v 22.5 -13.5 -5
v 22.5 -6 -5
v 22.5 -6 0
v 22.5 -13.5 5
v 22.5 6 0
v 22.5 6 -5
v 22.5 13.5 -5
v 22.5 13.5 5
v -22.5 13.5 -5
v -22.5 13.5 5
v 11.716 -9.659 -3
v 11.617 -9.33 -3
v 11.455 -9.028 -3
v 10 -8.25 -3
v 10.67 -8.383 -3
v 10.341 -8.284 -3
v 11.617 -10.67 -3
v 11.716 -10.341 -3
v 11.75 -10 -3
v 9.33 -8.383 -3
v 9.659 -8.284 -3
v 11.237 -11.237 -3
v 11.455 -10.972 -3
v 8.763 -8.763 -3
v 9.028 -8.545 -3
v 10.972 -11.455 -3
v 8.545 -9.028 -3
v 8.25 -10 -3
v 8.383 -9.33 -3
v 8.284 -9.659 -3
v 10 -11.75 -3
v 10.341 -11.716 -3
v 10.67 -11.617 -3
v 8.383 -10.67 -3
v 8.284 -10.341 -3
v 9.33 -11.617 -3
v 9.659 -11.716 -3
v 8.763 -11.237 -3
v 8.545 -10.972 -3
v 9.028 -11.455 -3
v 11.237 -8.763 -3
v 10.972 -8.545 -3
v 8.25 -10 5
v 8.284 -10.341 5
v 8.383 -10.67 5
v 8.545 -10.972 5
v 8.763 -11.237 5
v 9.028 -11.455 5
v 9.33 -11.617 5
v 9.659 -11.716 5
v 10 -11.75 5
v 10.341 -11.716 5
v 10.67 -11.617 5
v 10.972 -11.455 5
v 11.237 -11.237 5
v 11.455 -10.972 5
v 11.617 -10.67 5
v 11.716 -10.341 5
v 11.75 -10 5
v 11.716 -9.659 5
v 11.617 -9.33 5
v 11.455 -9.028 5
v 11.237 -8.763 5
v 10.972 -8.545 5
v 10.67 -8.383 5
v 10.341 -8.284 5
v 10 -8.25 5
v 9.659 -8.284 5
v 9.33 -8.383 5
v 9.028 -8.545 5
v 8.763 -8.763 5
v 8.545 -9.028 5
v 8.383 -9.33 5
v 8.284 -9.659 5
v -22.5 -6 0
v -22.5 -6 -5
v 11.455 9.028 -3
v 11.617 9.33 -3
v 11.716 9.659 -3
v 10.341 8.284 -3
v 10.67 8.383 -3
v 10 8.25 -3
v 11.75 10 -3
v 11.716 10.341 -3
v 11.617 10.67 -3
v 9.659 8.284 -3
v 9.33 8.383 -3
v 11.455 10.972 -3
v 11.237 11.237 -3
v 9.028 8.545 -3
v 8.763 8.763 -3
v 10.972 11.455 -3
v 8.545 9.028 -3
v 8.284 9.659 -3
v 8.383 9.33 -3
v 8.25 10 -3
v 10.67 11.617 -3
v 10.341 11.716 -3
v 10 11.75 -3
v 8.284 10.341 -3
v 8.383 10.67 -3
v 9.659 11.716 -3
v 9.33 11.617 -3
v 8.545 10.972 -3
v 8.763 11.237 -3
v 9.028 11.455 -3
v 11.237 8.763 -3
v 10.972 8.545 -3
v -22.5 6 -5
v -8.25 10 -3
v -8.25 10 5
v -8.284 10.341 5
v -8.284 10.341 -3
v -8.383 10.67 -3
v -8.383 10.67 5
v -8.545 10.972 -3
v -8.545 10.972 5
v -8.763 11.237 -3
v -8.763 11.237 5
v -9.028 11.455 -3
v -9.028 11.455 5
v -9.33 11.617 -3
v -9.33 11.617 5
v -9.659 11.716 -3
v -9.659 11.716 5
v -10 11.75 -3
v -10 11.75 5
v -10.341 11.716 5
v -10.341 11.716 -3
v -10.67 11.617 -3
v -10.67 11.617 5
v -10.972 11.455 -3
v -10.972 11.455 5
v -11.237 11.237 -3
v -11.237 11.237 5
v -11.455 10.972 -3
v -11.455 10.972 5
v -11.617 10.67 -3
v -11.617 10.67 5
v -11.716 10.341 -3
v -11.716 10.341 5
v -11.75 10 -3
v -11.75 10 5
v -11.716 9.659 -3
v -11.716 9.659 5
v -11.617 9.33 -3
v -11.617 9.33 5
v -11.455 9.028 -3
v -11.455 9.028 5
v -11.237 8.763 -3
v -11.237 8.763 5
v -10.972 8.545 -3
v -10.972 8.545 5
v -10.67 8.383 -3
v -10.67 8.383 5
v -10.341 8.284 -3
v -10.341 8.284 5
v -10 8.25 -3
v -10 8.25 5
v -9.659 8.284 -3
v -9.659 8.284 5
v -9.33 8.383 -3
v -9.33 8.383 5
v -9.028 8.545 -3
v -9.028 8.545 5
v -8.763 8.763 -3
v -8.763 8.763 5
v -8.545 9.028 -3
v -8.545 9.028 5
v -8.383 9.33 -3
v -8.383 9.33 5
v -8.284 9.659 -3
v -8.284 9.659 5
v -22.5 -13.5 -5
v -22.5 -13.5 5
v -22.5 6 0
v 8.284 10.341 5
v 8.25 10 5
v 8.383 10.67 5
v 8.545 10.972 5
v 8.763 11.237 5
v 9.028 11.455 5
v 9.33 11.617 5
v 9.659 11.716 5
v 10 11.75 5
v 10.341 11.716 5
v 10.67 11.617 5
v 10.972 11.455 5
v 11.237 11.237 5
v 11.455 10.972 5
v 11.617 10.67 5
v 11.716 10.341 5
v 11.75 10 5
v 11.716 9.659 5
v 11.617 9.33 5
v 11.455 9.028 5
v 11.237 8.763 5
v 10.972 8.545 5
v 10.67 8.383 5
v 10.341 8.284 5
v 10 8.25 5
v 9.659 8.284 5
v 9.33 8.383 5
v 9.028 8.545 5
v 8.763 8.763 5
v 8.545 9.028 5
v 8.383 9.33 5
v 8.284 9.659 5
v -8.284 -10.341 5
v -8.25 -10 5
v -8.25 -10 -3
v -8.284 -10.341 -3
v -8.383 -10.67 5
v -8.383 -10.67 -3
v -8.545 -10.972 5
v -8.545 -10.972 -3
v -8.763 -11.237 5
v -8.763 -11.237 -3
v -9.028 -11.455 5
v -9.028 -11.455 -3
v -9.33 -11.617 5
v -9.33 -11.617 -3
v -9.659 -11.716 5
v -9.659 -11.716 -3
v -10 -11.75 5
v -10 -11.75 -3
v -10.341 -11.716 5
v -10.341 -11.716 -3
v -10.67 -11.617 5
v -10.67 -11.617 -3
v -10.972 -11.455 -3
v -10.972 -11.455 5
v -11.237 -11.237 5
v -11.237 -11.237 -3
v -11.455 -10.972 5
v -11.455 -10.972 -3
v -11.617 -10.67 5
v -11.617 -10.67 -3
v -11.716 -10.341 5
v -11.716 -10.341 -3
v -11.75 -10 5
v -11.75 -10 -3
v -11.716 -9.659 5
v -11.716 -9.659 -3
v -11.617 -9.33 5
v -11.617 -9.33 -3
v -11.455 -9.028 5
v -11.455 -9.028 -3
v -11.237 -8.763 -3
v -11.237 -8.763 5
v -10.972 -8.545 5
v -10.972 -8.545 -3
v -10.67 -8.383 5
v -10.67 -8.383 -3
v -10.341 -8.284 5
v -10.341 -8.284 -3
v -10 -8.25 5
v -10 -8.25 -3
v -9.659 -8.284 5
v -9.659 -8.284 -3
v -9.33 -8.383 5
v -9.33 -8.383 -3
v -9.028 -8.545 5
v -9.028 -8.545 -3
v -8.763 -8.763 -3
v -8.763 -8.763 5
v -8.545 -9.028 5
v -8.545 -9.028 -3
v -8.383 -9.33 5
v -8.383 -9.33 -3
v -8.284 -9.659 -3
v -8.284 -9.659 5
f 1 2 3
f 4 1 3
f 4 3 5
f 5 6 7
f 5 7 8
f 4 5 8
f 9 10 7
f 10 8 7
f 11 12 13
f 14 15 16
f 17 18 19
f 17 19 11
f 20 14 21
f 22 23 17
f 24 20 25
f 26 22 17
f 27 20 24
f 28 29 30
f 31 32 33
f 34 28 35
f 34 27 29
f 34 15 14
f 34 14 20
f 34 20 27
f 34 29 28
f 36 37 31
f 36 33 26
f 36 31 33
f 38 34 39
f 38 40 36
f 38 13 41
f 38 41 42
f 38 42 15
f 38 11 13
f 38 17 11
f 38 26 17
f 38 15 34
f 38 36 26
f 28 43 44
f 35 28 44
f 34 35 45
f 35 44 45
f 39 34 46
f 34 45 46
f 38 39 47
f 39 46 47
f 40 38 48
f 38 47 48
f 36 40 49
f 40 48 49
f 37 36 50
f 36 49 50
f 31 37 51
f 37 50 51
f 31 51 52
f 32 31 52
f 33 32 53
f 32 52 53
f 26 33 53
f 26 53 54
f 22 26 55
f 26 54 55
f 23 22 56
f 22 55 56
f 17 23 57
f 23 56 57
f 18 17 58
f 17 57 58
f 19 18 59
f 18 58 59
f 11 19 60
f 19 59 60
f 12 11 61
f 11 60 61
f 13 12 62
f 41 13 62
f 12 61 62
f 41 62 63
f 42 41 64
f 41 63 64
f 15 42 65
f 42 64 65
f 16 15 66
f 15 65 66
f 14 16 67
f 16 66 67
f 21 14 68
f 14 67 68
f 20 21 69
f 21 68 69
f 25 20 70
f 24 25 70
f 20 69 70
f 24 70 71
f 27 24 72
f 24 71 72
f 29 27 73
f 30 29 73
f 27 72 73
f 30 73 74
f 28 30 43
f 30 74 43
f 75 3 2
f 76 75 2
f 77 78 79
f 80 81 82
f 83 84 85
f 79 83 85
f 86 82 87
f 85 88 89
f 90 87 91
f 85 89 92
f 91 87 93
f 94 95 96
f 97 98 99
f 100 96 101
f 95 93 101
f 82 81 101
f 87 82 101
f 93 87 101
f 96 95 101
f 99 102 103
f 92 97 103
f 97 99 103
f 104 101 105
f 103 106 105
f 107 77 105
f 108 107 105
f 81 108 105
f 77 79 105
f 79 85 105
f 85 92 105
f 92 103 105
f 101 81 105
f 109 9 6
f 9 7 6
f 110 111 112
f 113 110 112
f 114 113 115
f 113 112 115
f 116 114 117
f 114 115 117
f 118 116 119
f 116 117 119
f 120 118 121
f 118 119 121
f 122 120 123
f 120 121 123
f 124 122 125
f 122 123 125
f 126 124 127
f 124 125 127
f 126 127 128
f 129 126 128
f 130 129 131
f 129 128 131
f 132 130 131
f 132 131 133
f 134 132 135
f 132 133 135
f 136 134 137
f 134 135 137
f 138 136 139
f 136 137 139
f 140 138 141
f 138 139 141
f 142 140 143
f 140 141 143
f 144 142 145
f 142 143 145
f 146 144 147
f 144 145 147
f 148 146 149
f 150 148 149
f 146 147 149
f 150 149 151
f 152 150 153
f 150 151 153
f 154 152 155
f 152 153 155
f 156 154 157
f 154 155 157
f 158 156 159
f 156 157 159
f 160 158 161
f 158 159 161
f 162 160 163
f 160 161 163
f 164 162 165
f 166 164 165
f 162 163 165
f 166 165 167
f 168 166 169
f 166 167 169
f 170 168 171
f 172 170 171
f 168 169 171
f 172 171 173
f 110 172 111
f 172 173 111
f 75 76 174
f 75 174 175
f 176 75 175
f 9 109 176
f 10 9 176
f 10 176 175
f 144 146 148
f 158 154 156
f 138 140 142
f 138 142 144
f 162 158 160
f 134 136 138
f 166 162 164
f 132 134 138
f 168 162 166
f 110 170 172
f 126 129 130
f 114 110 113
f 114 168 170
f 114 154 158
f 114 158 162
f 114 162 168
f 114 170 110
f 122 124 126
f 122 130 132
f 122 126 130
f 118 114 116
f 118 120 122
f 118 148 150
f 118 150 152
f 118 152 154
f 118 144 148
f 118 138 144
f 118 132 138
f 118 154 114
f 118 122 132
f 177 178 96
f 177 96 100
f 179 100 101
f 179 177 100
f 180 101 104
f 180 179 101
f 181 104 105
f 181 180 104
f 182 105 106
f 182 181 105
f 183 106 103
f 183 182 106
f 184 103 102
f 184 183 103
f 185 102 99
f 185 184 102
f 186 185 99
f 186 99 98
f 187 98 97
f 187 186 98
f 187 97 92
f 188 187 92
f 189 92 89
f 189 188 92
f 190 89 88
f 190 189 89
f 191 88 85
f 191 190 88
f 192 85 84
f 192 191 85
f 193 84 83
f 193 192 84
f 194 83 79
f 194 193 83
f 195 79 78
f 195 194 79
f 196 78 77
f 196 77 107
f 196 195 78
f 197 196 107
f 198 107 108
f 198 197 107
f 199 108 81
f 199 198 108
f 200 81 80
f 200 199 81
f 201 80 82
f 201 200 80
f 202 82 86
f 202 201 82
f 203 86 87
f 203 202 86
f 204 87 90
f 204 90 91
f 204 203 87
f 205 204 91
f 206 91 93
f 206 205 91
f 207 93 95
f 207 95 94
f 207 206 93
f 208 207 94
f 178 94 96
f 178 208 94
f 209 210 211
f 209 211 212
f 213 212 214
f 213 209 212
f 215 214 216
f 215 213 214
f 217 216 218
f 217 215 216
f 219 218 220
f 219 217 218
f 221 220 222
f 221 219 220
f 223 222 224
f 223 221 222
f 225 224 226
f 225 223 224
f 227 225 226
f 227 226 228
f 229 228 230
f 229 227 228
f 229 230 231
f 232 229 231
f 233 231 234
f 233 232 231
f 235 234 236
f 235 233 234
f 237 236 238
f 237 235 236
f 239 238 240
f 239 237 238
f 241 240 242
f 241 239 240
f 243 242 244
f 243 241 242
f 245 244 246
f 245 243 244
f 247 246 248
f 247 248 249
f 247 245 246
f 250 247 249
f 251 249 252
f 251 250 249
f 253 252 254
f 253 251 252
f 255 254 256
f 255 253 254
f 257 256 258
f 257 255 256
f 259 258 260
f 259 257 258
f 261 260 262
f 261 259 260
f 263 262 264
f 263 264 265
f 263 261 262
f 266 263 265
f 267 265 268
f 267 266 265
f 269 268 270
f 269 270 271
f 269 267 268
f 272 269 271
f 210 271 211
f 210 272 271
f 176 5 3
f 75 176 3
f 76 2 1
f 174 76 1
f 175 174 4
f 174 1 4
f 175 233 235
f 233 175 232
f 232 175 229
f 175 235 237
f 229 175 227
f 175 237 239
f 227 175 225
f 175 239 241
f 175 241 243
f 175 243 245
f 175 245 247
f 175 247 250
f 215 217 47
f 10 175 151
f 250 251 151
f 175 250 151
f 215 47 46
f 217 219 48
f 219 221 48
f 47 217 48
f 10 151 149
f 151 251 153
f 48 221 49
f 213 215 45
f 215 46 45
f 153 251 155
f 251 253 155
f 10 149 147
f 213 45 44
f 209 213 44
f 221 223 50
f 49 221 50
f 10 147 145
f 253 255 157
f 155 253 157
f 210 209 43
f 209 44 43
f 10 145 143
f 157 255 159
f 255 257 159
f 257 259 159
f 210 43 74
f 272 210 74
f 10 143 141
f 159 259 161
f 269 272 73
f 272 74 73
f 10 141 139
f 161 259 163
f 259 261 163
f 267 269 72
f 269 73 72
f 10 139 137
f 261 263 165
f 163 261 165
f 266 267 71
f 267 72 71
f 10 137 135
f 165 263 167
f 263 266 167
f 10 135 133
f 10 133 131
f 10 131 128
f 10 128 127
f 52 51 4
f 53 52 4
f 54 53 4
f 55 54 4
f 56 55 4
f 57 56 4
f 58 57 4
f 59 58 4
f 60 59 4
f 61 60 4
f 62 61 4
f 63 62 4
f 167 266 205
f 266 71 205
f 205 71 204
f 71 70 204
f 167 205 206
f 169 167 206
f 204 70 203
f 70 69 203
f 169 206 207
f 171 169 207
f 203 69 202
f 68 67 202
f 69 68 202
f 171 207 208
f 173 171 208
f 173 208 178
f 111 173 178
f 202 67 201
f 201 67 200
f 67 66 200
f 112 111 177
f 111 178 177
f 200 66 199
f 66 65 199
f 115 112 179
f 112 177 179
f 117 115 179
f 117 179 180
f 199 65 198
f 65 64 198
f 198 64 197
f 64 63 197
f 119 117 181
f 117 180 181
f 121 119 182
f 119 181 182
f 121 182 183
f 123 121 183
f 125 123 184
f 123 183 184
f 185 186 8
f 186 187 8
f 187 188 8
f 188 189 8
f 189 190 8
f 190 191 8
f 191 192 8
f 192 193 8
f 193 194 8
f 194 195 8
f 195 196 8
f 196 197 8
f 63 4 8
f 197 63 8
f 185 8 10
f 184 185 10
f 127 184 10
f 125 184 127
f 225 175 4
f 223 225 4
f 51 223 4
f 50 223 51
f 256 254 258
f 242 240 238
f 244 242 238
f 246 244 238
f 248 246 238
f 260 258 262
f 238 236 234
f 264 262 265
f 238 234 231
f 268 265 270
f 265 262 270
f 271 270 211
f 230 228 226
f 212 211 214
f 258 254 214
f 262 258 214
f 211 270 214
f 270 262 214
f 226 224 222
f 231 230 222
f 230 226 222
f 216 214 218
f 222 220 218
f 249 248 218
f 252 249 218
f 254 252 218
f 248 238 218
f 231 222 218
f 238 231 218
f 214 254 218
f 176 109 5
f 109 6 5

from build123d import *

# Parameters (mm, degrees)
BOSS_EXTRUDE1_DEPTH     = 22.5
SKETCH3_R               = 1.75
CUT_EXTRUDE1_DEPTH      = 8
MIRROR3_COPY_1_SKETCH_R = 1.75
MIRROR3_COPY_1_DEPTH    = 8


with BuildPart() as part:
    # Sketch1 → Boss-Extrude1 (new, symmetric)
    with BuildSketch(Plane(origin=(0, 0, 0), x_dir=(0, 0, -1), z_dir=(1, 0, 0))):
        Polygon((5, -6), (5, -13.5), (-5, -13.5), (-5, 13.5), (5, 13.5), (5, 6), (0, 6), (0, -6), align=None)
    extrude(amount=BOSS_EXTRUDE1_DEPTH, both=True)

    # Sketch3 → Cut-Extrude1 (cut)
    with BuildSketch(Plane.XY.offset(5)):
        with Locations((-10, 10)):
            Circle(SKETCH3_R)
    cut_extrude1 = extrude(amount=-CUT_EXTRUDE1_DEPTH, mode=Mode.SUBTRACT)

    # Mirror2: Cut-Extrude1 across plane
    add(cut_extrude1.mirror(Plane.ZX), mode=Mode.SUBTRACT)

    # Mirror3: Cut-Extrude1 across plane
    add(cut_extrude1.mirror(Plane(origin=(0, 0, 0), x_dir=(0, 0, 1), z_dir=(1, 0, 0))), mode=Mode.SUBTRACT)

    # Mirror3 copy 1 sketch → Mirror3 copy 1 (cut)
    with BuildSketch(Plane(origin=(0, 0, 5), x_dir=(-1, 0, 0), z_dir=(0, 0, 1))):
        with Locations((-10, 10)):
            Circle(MIRROR3_COPY_1_SKETCH_R)
    extrude(amount=-MIRROR3_COPY_1_DEPTH, mode=Mode.SUBTRACT)


solid = part.part
